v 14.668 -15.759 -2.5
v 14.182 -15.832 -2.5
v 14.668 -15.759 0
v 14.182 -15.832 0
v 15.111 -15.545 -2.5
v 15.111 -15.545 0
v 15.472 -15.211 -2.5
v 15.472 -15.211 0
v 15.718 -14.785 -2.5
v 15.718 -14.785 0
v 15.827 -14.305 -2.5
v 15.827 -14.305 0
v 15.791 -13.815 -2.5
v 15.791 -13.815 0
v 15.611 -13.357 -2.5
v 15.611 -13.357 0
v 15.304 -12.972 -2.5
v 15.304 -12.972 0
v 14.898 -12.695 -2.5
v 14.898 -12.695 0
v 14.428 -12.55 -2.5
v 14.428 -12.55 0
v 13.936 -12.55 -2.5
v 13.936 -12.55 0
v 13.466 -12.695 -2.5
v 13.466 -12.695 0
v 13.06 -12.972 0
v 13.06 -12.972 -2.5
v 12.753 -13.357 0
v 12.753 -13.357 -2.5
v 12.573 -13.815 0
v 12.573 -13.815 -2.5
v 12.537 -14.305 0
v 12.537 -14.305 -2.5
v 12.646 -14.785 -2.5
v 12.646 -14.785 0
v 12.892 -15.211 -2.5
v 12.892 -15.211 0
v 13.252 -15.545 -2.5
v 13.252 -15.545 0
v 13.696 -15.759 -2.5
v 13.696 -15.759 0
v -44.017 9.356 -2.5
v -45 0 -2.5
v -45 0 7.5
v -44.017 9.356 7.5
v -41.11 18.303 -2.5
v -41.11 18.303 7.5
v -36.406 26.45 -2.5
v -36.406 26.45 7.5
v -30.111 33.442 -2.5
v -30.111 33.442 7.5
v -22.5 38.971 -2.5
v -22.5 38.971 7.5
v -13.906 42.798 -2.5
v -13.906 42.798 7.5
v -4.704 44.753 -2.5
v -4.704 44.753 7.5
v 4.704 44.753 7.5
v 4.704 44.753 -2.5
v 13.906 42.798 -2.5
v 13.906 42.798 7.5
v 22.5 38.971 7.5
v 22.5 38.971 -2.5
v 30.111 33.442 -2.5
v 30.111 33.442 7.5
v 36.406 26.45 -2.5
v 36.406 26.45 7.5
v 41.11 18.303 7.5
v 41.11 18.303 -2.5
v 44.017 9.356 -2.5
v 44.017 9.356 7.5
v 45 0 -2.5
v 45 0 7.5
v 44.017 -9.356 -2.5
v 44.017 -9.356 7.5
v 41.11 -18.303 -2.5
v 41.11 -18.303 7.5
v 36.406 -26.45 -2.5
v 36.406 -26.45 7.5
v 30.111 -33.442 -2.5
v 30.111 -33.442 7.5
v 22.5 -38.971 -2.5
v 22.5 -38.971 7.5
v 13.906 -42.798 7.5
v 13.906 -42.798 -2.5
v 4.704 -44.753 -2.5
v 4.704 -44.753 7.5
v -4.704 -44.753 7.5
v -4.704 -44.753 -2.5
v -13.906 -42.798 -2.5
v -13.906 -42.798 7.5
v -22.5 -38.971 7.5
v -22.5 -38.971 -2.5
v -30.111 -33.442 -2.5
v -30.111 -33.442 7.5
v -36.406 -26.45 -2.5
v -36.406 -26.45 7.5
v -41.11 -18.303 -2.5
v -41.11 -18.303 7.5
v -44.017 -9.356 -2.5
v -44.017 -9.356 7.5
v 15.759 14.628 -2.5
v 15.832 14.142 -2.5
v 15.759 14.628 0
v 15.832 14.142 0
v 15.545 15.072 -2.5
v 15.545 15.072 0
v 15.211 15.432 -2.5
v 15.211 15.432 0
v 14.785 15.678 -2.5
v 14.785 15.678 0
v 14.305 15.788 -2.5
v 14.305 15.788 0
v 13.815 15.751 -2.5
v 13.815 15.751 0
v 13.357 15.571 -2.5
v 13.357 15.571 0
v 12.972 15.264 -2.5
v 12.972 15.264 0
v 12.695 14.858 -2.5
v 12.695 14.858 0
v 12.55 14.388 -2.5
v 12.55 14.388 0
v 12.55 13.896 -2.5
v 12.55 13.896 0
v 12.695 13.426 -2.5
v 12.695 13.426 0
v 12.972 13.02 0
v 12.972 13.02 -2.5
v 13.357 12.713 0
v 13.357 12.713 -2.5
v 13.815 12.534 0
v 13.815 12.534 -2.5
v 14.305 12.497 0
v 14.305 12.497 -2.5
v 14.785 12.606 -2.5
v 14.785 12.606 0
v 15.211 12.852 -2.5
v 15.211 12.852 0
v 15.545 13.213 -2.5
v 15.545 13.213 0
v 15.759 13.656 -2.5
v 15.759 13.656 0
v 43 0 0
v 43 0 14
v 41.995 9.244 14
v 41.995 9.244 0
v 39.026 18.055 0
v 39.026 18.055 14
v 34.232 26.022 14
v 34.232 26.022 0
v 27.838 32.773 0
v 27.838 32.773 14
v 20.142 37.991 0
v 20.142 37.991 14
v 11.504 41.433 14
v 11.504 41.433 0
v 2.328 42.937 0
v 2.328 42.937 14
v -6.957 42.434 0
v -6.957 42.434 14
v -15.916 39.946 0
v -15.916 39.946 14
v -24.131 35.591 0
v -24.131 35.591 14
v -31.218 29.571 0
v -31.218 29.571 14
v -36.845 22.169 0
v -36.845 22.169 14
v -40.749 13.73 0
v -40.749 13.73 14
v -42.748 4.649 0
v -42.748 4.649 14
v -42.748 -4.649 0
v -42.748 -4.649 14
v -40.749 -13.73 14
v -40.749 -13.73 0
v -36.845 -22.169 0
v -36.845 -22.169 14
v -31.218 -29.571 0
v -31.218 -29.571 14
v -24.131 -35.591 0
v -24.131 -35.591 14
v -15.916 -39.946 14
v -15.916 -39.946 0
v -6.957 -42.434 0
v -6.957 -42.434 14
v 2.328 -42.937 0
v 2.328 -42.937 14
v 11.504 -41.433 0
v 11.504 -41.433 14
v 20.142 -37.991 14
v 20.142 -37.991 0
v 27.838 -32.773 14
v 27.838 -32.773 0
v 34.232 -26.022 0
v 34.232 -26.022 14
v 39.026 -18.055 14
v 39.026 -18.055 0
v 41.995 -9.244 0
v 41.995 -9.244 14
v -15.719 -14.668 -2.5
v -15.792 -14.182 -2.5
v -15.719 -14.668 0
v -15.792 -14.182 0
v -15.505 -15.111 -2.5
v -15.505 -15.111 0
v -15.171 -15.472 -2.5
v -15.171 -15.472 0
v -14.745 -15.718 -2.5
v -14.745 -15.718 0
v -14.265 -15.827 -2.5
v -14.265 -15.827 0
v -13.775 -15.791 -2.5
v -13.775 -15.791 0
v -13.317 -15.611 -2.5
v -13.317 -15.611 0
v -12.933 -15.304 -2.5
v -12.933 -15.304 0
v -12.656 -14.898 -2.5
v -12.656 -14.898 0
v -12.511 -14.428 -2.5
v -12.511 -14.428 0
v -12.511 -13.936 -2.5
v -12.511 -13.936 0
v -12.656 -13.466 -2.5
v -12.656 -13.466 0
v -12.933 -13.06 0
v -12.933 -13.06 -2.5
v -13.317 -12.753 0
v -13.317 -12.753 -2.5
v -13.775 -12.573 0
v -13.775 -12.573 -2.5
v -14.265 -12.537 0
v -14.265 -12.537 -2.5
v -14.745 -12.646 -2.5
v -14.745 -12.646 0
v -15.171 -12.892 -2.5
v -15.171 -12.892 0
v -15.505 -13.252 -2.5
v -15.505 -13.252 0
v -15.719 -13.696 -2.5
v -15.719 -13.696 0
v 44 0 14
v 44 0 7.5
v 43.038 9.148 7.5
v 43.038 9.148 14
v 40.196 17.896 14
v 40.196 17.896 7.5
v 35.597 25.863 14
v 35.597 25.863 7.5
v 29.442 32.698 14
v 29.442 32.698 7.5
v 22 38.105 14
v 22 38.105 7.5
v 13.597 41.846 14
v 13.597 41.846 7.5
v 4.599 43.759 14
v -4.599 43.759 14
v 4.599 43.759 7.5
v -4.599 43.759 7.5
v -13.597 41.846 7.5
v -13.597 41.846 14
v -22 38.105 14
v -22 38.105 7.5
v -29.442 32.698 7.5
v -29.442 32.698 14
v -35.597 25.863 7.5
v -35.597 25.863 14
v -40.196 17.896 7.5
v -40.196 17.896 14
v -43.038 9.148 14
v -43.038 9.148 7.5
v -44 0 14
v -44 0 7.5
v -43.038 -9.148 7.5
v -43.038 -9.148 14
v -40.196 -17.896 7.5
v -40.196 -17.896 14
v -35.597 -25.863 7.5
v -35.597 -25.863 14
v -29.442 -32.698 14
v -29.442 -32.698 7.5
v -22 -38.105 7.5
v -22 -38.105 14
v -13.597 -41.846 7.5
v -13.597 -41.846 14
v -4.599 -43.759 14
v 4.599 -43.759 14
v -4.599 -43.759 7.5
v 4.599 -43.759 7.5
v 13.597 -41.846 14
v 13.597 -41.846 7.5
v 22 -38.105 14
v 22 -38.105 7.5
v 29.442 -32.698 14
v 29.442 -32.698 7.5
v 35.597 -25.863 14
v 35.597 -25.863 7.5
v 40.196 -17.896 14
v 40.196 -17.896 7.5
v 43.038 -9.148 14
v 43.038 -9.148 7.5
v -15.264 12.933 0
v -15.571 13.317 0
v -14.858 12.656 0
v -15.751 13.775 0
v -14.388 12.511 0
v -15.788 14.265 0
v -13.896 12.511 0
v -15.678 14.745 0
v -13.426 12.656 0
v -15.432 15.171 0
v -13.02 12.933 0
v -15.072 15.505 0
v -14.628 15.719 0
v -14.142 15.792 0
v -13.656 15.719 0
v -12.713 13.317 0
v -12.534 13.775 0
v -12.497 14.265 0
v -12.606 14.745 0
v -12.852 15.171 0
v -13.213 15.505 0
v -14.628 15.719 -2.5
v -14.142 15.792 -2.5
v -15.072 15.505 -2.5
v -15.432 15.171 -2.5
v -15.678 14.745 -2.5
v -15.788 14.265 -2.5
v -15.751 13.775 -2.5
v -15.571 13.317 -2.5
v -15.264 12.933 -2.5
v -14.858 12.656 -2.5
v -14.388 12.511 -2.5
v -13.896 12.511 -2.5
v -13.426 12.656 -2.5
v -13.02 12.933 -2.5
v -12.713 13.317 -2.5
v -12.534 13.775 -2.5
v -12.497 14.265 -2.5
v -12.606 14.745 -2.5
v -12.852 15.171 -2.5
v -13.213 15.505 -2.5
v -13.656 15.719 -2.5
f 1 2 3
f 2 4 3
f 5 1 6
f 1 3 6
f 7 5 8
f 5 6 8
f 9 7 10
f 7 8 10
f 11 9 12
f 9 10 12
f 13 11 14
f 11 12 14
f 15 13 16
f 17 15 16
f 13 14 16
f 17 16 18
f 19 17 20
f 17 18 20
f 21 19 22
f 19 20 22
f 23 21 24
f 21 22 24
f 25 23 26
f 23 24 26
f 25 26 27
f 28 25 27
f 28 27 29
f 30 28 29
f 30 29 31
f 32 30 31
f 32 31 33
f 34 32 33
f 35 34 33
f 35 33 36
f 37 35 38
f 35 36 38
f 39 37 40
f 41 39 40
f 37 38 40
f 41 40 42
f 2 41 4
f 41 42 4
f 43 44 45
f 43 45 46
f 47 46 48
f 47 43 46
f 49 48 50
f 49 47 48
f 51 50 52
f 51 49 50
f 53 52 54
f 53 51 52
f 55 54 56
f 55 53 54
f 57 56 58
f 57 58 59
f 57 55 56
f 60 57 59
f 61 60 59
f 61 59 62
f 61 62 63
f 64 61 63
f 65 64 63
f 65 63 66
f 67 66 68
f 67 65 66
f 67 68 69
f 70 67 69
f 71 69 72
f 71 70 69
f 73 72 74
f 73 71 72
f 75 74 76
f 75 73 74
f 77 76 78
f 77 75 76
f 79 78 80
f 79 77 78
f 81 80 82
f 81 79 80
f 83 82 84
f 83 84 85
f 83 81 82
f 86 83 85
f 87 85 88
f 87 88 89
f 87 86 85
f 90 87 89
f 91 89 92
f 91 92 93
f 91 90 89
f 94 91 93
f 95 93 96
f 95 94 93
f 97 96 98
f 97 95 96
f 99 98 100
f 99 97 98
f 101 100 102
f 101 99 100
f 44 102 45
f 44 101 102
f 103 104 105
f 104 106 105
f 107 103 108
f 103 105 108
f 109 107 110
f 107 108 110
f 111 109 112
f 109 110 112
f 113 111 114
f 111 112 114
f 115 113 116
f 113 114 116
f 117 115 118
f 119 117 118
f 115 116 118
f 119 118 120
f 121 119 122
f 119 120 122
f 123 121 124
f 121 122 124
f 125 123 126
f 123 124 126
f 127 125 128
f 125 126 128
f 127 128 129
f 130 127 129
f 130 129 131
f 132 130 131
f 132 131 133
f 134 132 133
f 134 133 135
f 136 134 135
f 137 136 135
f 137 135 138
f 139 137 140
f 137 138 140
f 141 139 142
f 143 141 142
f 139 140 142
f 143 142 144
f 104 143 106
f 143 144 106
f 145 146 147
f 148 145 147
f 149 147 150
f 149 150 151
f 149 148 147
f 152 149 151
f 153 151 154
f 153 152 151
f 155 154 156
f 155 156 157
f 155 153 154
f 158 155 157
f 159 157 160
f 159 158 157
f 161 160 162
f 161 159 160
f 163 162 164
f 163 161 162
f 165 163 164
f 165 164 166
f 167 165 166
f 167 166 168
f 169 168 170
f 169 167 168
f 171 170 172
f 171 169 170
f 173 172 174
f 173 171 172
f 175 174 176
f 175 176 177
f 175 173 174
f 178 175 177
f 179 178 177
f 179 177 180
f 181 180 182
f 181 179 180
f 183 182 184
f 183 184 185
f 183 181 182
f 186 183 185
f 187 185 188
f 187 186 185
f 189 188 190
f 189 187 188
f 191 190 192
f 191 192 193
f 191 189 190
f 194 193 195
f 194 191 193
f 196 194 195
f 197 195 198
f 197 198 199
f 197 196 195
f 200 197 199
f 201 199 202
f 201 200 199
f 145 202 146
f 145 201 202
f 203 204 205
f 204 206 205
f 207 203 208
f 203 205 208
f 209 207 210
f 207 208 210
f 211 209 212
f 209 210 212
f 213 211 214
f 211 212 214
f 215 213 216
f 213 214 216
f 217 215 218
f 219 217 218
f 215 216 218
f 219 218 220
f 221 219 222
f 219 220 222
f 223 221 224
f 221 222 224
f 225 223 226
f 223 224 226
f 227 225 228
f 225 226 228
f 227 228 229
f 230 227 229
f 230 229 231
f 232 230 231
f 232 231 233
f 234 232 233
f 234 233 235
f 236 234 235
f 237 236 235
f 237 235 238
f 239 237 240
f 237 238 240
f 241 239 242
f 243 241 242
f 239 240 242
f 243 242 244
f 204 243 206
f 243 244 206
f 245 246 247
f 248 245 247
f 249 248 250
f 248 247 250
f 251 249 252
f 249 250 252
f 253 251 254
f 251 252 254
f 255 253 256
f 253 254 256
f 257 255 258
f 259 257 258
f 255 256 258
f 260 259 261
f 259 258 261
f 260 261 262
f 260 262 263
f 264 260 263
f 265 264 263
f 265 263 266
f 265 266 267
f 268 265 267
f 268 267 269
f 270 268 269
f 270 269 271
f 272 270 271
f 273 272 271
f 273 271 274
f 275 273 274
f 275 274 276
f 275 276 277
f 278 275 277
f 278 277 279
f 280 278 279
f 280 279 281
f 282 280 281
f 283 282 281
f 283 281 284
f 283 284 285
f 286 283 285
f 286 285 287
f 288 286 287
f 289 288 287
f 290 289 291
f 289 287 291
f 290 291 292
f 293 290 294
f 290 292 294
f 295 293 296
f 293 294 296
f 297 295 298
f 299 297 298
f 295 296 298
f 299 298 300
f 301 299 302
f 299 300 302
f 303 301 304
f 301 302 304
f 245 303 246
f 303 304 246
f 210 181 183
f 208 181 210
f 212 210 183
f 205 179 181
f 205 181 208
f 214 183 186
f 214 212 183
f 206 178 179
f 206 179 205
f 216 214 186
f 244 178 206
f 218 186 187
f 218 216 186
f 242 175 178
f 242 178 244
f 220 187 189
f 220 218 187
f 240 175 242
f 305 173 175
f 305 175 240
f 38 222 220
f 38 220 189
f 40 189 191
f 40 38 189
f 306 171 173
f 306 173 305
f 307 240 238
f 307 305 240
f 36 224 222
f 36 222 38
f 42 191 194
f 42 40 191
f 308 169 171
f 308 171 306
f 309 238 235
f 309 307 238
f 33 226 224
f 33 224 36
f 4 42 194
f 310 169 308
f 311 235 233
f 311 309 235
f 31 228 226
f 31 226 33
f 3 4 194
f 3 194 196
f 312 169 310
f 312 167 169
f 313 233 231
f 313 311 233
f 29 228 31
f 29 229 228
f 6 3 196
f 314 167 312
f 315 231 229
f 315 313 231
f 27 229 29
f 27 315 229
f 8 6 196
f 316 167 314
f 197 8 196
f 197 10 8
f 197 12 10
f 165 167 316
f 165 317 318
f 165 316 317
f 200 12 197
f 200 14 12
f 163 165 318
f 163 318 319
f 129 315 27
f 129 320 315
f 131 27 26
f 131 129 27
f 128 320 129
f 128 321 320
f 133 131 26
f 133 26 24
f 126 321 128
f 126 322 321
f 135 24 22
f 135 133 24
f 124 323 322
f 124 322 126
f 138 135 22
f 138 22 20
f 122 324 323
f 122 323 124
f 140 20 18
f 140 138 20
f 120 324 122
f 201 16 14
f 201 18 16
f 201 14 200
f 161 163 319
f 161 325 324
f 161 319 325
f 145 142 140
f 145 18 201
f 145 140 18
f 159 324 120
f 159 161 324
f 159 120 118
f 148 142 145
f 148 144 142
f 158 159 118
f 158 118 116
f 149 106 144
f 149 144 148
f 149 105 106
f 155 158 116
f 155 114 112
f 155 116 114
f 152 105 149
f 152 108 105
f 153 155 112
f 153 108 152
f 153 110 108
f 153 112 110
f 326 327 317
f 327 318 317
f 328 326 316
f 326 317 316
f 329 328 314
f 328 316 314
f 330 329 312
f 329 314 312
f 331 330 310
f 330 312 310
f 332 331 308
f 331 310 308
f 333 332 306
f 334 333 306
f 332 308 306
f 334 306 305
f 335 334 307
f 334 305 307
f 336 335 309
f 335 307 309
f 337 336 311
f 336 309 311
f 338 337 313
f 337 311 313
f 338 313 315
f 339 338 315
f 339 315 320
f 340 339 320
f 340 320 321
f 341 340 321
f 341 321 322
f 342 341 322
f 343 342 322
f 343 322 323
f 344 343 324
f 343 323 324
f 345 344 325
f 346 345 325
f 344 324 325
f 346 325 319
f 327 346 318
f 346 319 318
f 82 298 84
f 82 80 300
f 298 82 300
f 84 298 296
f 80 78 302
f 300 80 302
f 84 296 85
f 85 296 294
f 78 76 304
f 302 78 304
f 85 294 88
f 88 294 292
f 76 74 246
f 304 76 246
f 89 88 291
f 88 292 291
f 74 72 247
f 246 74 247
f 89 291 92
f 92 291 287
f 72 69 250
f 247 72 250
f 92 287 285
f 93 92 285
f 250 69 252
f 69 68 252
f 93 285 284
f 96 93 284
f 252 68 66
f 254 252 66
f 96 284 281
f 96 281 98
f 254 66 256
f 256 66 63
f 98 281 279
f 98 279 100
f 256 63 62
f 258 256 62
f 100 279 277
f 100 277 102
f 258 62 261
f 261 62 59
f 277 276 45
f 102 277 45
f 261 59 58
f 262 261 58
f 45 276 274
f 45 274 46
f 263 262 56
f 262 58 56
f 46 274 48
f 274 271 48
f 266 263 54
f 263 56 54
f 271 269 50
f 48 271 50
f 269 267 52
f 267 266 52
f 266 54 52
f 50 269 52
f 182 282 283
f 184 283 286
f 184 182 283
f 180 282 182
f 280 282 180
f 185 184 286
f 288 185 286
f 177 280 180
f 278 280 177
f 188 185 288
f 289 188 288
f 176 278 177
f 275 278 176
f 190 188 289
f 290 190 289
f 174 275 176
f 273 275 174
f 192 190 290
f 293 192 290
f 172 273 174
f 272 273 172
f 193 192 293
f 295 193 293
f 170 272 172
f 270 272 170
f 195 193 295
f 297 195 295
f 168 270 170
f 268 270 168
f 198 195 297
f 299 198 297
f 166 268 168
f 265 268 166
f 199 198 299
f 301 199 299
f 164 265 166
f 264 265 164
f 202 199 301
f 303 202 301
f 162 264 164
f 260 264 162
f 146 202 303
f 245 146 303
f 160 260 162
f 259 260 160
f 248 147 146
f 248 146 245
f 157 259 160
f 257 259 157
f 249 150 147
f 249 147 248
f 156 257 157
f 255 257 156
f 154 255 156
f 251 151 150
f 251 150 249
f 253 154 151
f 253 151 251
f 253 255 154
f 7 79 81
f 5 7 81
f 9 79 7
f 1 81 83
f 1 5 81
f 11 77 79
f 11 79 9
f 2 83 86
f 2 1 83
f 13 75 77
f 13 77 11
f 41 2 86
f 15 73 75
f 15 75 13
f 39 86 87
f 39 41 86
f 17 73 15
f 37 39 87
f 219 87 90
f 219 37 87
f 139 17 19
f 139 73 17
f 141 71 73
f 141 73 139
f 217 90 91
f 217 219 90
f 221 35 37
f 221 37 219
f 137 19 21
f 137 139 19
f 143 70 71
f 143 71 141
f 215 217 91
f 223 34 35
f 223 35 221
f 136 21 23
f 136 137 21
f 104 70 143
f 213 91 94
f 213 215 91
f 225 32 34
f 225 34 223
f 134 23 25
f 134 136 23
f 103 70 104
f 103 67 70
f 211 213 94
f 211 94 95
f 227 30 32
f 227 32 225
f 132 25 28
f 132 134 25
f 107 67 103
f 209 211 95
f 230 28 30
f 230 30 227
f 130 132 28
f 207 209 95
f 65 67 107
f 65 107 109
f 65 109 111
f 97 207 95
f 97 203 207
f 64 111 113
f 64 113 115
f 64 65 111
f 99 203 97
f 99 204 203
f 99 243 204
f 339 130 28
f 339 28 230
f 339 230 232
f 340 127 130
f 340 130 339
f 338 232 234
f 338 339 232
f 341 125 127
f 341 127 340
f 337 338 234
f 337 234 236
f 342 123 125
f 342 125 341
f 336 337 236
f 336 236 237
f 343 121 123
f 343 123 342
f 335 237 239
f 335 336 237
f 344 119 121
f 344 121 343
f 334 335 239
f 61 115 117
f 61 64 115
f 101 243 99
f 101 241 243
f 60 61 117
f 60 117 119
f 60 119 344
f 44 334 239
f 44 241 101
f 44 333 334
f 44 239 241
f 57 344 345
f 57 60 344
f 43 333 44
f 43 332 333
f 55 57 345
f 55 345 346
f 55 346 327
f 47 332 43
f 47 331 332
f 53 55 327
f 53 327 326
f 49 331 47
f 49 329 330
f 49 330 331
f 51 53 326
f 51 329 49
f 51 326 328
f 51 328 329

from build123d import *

# Parameters (mm, degrees)
SKETCH1_R           = 44
SKETCH1_R_2         = 43
BOSS_EXTRUDE1_DEPTH = 14
SKETCH1_4_R         = 44
SKETCH1_4_R_2       = 43
BOSS_EXTRUDE2_DEPTH = 2.5
SKETCH5_W           = 1.65
SKETCH5_H           = 2.5
CIRPATTERN1_COUNT   = 4
SKETCH6_R           = 45
SKETCH6_R_2         = 44
BOSS_EXTRUDE3_DEPTH = 10


with BuildPart() as part:
    # Sketch1 → Boss-Extrude1 (new body)
    with BuildSketch(Plane.XY):
        Circle(SKETCH1_R)
        Circle(SKETCH1_R_2, mode=Mode.SUBTRACT)
    extrude(amount=BOSS_EXTRUDE1_DEPTH)



with BuildPart() as body_2:
    # Sketch1<4> → Boss-Extrude2 (new body)
    # profile 1 of 2: a face of its own
    with BuildSketch(Plane.XY):
        Circle(SKETCH1_4_R)
        Circle(SKETCH1_4_R_2, mode=Mode.SUBTRACT)
    # profile 2 of 2: a face of its own
    with BuildSketch(Plane.XY):
        Circle(SKETCH1_4_R_2)
    extrude(amount=-BOSS_EXTRUDE2_DEPTH)

    # Sketch5 → M4x0.7 Tapped Hole1 (revolve, cut)
    with BuildSketch(Plane(origin=(-14.142135624, 14.142135624, -2.5), x_dir=(0, 1, 0), z_dir=(1, 0, 0))):
        with Locations((0.825, 1.25)):
            Rectangle(SKETCH5_W, SKETCH5_H)
    m4x0_7_tapped_hole1 = revolve(axis=Axis((-14.142135624, 14.142135624, -8.85), (0, 0, 1)), mode=Mode.SUBTRACT)

    # CirPattern1: M4x0.7 Tapped Hole1 ×4 about axis
    cirpattern1_axis = Axis((0.019915384, -0.019915384, 0), (0, 0, 1))
    for i in range(1, CIRPATTERN1_COUNT):
        add(m4x0_7_tapped_hole1.rotate(cirpattern1_axis, i * 360 / CIRPATTERN1_COUNT), mode=Mode.SUBTRACT)


with BuildPart() as part_1:
    add(part.part)

    add(body_2.part)  # Boss-Extrude3 merges body 2
    # Sketch6 → Boss-Extrude3 (add)
    with BuildSketch(Plane(origin=(0, 0, -2.5), x_dir=(-1, 0, 0), z_dir=(0, 0, -1))):
        Circle(SKETCH6_R)
        Circle(SKETCH6_R_2, mode=Mode.SUBTRACT)
    extrude(amount=-BOSS_EXTRUDE3_DEPTH)


solid = part_1.part
